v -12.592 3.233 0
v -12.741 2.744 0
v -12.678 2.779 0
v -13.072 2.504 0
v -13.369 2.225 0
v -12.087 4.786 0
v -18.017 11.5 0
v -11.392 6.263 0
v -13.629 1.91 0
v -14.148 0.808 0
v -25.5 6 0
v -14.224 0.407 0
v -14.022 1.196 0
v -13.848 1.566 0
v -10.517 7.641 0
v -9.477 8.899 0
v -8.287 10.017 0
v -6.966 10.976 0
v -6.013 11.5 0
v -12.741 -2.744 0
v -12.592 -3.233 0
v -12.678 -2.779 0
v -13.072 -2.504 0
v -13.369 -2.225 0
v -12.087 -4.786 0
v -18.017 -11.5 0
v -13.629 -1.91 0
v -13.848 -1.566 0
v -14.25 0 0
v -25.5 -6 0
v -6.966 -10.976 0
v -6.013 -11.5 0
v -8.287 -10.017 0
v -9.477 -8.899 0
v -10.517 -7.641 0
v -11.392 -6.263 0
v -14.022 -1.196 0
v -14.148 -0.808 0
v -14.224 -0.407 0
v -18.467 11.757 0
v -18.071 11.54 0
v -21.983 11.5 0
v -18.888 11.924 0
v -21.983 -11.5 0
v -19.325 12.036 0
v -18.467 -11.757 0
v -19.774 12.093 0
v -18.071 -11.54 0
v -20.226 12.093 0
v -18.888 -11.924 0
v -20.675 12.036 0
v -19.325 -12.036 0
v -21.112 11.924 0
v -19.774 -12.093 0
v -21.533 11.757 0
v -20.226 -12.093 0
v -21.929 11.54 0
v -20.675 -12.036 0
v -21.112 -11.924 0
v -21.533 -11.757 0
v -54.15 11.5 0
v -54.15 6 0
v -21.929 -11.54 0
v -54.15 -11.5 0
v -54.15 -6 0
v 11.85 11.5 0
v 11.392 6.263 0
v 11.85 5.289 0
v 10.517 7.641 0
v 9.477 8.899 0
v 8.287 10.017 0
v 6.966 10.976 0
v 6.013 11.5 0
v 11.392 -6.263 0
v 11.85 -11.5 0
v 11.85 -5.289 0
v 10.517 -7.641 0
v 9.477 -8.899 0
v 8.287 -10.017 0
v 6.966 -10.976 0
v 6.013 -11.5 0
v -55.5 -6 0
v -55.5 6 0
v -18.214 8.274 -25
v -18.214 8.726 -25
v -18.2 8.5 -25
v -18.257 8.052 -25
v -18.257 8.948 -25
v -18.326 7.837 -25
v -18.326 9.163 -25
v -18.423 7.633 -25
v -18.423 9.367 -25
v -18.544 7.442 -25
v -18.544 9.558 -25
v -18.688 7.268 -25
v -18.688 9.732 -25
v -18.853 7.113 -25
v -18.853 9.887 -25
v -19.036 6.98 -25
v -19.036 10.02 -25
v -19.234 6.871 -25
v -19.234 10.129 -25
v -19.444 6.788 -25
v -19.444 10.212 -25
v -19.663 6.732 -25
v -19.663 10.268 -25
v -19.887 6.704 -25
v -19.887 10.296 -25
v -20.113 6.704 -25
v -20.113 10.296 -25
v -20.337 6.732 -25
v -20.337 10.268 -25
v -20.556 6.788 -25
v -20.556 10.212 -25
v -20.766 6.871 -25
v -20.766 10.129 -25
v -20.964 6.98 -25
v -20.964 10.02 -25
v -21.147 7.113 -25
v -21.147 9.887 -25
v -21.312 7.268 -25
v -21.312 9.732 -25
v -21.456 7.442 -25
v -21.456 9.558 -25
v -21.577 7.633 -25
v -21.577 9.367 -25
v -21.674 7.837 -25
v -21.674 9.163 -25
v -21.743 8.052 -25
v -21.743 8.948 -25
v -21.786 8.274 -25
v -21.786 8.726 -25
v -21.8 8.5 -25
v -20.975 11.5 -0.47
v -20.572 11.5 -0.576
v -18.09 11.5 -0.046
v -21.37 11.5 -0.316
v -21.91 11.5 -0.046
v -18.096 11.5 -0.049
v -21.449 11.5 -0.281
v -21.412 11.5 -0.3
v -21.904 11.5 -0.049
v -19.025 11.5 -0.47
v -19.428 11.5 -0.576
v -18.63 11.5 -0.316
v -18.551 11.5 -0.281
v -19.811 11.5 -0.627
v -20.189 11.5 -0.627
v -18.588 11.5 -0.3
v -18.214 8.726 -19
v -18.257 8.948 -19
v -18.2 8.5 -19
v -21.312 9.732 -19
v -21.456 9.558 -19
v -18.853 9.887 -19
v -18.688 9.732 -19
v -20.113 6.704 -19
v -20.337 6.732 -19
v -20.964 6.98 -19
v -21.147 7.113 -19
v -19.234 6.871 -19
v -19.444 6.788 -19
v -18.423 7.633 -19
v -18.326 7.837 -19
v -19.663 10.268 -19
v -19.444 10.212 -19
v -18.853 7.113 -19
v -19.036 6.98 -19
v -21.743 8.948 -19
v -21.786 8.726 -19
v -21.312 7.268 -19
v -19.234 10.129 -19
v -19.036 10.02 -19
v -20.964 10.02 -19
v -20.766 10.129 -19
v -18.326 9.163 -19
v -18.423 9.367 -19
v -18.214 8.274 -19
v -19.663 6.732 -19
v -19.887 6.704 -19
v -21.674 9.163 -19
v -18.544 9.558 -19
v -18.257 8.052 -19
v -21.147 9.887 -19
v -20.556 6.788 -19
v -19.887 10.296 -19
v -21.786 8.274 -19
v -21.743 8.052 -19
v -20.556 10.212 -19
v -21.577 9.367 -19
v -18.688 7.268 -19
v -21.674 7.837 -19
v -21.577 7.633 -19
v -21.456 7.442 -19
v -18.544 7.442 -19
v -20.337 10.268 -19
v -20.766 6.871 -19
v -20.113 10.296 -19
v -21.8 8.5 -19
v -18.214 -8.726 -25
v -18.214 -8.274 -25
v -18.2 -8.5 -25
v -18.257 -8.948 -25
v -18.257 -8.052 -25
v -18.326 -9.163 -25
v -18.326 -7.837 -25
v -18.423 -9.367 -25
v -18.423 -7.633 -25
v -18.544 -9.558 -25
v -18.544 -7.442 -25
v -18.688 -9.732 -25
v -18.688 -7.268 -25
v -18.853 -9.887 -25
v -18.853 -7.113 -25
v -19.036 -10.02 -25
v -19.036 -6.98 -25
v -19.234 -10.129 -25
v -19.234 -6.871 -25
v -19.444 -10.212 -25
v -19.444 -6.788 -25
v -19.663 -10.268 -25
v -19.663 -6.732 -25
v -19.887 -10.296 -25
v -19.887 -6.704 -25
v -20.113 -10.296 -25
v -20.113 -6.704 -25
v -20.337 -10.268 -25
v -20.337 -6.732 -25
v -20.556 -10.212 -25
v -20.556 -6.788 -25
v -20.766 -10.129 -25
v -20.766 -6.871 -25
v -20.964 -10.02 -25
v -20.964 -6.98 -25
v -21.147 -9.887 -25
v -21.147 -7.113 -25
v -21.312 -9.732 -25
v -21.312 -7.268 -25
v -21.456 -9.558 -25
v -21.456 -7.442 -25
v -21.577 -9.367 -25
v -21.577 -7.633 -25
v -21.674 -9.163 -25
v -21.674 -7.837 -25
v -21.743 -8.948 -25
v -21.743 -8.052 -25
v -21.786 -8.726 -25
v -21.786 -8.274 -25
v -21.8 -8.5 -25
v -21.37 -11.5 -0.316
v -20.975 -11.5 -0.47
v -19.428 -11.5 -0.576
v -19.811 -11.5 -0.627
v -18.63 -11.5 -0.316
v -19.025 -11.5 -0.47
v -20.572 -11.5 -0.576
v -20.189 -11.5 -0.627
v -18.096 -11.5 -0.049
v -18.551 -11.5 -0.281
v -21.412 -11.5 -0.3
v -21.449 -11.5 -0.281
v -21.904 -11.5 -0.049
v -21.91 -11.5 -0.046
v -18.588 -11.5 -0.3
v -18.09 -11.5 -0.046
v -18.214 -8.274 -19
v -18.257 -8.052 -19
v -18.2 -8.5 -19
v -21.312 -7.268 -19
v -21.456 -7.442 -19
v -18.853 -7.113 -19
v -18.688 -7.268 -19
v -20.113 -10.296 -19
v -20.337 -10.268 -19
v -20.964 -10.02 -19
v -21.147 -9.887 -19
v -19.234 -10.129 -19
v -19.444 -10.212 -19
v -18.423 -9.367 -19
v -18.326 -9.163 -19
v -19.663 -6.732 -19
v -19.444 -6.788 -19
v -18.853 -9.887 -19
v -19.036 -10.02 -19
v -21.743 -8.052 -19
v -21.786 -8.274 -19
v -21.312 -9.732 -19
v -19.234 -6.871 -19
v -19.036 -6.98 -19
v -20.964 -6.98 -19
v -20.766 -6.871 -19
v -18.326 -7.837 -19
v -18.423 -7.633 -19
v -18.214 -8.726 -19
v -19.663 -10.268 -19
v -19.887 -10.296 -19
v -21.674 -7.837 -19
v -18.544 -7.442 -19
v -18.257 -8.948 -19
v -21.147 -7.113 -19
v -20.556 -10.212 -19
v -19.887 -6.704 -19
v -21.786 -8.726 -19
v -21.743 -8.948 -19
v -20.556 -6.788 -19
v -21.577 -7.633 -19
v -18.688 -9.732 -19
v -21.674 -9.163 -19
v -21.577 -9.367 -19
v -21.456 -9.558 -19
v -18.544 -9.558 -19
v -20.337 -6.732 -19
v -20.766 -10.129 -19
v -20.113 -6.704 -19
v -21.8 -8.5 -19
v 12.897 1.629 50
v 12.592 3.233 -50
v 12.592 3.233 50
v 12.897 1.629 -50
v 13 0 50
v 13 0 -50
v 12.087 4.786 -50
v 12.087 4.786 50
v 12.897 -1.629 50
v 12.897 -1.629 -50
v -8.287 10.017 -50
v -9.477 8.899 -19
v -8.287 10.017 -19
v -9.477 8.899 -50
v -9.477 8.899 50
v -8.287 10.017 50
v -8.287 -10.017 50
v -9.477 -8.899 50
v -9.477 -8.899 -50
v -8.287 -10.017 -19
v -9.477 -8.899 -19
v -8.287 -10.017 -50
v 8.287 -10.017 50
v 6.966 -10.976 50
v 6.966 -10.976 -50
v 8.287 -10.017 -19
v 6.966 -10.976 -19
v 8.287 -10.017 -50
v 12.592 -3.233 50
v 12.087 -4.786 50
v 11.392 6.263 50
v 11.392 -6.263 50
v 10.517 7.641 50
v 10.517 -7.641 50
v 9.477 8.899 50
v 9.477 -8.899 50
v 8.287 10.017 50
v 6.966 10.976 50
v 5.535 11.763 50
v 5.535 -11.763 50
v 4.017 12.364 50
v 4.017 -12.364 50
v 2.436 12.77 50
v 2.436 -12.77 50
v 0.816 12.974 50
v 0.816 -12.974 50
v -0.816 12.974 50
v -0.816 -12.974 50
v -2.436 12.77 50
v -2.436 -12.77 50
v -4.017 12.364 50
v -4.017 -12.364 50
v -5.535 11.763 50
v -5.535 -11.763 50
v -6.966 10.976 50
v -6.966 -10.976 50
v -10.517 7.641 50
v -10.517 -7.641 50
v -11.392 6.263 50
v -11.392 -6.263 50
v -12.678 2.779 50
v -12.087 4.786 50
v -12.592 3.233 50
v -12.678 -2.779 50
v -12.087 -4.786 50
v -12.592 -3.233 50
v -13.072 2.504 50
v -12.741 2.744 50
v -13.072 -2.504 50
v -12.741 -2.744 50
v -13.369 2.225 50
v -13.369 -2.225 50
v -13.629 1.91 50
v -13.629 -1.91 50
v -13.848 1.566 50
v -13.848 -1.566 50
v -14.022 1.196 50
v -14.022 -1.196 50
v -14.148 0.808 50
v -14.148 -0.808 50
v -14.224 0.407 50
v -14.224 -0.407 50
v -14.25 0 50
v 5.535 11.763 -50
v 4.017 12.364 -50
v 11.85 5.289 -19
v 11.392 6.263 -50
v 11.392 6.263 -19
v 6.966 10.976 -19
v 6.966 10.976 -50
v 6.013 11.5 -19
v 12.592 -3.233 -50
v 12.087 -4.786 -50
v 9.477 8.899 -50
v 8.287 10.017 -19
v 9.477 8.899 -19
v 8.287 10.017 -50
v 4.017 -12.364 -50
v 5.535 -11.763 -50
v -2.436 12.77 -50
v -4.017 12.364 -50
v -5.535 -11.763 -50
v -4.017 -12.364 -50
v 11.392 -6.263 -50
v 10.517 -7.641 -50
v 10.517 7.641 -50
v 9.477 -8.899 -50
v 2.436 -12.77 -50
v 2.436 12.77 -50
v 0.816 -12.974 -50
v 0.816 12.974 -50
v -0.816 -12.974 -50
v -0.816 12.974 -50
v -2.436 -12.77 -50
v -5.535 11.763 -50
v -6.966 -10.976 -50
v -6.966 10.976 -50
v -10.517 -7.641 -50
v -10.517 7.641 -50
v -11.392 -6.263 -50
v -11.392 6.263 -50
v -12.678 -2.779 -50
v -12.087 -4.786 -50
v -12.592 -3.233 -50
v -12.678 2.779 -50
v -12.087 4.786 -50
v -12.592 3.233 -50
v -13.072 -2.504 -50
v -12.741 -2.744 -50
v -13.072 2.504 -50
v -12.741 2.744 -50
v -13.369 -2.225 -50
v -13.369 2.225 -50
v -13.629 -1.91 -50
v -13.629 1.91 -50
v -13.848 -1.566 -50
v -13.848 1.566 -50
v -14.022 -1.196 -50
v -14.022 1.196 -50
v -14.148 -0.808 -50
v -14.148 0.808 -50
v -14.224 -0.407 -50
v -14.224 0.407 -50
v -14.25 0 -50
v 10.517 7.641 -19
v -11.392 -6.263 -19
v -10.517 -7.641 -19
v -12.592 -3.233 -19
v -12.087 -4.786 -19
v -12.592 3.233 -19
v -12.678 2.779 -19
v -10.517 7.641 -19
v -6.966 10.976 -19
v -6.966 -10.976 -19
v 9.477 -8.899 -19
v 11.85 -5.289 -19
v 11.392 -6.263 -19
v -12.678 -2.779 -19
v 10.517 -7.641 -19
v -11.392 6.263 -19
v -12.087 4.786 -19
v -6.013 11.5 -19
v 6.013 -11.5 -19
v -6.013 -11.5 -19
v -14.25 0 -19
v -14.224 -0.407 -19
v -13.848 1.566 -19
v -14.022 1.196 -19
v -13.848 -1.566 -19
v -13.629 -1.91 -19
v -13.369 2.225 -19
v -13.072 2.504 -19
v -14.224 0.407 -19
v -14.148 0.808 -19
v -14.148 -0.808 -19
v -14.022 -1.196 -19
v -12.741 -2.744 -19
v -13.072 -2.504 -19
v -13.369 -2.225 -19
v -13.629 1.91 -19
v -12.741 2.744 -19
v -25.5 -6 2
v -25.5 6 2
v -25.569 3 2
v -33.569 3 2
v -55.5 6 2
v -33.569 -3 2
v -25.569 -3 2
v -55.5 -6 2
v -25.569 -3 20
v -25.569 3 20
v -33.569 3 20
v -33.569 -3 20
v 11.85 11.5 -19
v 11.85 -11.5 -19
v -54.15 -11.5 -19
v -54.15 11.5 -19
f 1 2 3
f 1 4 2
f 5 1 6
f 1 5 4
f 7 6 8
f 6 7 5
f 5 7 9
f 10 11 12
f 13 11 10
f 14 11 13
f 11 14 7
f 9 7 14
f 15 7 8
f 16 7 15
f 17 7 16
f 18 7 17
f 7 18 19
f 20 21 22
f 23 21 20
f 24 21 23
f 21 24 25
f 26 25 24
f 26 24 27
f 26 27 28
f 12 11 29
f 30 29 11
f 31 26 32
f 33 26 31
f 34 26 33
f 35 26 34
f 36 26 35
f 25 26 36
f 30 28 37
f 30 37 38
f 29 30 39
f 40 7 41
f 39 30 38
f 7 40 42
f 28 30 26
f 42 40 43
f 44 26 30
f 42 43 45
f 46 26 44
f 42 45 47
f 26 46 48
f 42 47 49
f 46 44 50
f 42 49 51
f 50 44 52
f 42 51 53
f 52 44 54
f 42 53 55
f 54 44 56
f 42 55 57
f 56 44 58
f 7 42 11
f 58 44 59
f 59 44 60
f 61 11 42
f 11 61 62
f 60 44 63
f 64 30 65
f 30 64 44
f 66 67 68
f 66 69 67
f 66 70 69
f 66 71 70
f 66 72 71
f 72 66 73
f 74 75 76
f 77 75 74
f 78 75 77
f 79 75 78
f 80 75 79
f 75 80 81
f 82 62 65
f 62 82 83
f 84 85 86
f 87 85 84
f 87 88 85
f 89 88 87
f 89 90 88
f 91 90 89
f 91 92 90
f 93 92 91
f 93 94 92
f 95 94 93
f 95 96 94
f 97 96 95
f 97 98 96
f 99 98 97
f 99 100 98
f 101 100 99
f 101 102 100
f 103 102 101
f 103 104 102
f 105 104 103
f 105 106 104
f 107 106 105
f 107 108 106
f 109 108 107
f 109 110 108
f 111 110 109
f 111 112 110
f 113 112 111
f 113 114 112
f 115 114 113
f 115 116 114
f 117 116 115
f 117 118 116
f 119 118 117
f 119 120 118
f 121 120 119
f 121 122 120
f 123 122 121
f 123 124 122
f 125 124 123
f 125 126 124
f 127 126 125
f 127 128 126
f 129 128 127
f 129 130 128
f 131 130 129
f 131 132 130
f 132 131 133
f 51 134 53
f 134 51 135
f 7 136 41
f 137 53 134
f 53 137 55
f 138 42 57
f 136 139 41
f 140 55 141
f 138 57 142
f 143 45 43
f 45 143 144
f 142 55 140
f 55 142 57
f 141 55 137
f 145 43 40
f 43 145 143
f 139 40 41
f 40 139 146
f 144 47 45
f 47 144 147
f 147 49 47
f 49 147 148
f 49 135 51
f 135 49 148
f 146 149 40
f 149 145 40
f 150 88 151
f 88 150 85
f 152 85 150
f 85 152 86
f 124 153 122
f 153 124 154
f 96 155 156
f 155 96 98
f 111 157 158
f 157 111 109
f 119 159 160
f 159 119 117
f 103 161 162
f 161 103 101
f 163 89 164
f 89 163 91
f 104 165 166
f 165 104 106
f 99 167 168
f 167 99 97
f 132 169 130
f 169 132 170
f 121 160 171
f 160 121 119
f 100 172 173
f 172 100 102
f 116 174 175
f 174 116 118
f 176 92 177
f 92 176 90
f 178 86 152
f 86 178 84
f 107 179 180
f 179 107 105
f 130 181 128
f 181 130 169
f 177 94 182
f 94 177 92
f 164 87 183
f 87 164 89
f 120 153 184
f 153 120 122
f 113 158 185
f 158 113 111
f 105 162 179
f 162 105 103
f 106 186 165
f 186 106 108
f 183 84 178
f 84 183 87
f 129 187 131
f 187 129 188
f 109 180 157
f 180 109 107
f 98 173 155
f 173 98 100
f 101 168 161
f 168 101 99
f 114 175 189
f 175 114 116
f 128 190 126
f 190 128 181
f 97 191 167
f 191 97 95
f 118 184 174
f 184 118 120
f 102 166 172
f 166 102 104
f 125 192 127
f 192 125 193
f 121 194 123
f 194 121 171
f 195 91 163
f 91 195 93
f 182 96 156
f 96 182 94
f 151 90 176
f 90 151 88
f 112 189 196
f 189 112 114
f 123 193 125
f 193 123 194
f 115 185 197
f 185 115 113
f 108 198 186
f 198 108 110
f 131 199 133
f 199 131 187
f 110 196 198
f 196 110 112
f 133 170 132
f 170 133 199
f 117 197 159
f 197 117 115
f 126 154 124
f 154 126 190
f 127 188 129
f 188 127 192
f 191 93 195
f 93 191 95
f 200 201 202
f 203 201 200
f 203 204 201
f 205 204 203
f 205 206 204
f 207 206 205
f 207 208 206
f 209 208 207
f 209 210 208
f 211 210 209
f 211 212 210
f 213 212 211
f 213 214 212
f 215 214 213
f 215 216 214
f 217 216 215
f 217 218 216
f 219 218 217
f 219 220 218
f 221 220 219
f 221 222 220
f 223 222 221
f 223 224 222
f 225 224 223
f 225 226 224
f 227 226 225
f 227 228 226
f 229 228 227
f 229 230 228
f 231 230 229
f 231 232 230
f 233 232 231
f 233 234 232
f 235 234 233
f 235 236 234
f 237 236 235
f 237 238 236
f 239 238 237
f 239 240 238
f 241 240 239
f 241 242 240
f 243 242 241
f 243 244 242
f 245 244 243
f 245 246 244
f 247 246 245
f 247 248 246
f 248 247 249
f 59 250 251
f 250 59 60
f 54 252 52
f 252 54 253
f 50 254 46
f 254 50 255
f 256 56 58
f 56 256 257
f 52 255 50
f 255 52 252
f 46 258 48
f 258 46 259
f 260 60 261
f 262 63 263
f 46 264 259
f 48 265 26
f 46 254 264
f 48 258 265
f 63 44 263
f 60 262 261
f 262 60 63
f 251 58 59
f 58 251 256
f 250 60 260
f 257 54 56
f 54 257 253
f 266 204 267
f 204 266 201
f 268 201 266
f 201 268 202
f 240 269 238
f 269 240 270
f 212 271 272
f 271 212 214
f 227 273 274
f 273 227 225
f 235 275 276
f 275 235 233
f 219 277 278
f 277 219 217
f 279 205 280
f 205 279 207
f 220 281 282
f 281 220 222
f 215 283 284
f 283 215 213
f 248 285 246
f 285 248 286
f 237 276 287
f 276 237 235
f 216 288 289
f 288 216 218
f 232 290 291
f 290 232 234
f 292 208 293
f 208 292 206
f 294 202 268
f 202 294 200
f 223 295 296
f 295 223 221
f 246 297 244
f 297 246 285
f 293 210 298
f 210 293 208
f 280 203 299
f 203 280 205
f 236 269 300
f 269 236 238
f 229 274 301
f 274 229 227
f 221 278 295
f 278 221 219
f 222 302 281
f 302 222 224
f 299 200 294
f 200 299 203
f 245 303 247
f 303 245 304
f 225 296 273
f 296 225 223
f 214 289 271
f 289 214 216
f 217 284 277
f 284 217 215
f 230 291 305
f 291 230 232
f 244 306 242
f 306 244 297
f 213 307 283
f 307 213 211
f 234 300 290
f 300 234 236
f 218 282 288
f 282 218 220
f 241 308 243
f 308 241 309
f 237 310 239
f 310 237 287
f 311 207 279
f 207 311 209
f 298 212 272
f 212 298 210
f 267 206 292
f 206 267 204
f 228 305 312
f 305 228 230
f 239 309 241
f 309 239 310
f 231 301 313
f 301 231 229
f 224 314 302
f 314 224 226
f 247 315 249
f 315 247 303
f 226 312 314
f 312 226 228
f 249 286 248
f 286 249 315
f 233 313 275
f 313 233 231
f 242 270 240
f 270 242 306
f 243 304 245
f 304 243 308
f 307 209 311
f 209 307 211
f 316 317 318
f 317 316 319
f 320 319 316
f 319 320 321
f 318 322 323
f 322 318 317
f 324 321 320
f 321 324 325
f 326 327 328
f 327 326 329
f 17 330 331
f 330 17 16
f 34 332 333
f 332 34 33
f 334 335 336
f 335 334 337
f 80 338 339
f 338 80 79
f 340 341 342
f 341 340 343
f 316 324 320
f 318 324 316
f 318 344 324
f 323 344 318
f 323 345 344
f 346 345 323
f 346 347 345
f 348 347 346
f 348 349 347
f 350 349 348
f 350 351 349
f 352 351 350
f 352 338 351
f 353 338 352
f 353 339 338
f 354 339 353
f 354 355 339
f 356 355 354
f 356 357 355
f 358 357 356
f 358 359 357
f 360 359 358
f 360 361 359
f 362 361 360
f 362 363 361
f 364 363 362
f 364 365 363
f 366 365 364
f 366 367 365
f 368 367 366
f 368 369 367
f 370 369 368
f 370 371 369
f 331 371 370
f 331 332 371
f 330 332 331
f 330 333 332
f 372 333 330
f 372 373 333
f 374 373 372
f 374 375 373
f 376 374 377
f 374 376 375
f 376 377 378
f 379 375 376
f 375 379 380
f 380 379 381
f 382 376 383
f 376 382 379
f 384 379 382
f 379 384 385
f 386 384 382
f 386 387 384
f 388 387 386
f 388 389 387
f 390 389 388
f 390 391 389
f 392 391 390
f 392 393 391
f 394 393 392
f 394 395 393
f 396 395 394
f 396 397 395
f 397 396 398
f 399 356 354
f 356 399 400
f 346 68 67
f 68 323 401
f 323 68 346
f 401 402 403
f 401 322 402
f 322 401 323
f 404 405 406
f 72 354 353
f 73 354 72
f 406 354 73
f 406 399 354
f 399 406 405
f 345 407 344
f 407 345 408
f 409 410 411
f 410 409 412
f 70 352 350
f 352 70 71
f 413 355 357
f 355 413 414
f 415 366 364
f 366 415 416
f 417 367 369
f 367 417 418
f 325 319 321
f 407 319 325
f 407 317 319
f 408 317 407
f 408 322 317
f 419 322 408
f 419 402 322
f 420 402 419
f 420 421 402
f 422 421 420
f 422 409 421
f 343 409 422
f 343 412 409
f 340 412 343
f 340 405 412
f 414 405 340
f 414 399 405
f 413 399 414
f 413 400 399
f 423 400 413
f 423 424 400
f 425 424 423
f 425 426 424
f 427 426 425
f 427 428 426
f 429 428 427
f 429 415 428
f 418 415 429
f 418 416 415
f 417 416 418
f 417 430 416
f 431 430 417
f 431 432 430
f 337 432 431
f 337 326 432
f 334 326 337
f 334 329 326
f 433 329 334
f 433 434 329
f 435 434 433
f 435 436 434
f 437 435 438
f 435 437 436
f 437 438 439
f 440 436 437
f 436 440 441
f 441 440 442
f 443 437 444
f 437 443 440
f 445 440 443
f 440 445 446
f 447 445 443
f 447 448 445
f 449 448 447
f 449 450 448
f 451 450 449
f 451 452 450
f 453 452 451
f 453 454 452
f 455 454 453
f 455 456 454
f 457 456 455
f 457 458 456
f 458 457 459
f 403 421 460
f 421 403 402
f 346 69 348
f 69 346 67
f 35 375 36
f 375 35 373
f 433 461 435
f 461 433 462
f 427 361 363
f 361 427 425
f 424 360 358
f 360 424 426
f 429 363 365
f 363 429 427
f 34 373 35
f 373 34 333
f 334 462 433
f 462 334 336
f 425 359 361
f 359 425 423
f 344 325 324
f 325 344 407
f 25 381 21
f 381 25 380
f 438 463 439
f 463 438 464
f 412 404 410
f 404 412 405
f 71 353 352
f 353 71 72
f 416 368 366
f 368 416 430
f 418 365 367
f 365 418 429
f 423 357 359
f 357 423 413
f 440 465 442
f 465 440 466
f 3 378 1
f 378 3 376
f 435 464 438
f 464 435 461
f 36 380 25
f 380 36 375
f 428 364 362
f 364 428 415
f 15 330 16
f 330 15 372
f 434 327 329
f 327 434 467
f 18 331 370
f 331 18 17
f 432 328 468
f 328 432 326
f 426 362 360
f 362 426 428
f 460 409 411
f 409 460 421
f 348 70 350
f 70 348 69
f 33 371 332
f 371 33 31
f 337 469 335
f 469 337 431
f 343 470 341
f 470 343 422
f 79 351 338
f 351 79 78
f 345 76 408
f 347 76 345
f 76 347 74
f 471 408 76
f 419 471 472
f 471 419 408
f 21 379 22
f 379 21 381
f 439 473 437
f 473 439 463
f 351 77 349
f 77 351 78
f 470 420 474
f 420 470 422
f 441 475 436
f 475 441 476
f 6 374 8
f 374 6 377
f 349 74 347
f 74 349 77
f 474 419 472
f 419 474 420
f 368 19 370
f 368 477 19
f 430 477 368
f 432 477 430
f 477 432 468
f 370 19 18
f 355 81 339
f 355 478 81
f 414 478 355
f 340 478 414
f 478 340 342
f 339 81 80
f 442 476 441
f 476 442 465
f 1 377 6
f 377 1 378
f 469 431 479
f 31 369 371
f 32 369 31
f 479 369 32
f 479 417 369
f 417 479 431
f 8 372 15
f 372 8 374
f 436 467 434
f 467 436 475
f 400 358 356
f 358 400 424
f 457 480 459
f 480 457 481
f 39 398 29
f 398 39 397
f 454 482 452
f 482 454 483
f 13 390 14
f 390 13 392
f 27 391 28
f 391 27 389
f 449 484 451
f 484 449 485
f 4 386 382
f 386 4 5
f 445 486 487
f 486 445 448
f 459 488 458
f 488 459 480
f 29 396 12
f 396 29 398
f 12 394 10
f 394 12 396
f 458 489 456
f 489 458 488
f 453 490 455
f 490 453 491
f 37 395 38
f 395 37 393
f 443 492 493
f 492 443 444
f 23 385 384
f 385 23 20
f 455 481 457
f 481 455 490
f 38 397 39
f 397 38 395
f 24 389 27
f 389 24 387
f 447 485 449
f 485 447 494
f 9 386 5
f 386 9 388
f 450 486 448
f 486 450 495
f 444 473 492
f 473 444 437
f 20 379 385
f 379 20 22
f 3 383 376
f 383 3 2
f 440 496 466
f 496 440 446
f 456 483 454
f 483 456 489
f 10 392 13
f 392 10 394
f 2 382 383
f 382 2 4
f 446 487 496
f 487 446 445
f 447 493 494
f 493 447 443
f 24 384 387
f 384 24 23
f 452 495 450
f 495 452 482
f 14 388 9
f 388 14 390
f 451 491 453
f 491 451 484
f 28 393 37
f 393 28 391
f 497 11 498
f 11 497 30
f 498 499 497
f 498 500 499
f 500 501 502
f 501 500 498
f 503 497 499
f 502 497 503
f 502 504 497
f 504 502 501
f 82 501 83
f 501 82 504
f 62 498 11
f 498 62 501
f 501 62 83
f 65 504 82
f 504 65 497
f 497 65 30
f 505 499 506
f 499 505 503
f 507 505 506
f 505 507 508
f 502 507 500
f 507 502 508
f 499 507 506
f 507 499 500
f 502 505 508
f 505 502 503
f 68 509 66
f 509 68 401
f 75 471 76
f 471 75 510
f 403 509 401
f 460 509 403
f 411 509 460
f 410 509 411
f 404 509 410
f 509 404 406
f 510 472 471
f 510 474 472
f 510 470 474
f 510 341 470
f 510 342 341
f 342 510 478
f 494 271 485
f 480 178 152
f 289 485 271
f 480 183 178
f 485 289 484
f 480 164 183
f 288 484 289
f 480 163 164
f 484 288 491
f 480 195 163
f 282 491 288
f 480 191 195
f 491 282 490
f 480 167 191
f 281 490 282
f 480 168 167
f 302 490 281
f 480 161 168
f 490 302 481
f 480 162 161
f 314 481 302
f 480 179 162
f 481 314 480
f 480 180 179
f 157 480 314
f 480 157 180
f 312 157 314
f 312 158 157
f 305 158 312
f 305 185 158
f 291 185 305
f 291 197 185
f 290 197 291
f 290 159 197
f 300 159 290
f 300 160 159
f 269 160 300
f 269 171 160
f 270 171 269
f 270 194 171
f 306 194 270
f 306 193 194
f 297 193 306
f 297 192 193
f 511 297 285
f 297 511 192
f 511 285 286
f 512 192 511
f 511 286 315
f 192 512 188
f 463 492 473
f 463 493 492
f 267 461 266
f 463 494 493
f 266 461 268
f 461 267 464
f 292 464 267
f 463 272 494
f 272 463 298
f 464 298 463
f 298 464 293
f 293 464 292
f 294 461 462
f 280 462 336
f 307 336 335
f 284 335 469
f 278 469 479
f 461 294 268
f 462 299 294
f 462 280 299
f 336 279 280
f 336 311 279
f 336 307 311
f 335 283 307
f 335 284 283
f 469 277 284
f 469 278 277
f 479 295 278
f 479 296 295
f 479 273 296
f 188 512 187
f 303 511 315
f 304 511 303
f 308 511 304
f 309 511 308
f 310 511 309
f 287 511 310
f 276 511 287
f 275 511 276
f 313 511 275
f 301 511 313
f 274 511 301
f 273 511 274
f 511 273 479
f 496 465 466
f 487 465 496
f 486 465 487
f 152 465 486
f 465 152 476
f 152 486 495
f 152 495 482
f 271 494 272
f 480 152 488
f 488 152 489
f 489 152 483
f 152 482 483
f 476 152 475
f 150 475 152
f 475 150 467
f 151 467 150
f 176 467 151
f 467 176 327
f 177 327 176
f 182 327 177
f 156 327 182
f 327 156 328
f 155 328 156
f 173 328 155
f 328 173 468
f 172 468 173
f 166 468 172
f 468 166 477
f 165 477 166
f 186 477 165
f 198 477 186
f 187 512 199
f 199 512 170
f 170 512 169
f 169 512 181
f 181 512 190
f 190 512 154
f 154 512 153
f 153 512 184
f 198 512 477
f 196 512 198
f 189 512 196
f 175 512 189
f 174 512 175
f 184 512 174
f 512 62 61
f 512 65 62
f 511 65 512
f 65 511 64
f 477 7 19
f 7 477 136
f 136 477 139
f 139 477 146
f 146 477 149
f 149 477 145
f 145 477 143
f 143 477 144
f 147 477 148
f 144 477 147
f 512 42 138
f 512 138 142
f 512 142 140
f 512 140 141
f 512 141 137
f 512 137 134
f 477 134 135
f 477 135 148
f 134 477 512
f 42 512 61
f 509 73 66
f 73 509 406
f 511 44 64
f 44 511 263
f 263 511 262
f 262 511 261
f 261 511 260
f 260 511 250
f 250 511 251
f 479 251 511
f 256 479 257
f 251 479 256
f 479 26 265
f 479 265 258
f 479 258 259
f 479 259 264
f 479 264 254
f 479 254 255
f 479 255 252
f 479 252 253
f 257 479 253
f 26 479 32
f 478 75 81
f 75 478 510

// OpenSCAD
$fn = 50;


difference() {
	union() {
		translate(v = [-20, 8.5000000000, 0]) {
			rotate(a = [0, 0, 0]) {
				difference() {
					union() {
						translate(v = [0, 0, -25.0000000000]) {
							cylinder(h = 25, r = 1.5000000000);
						}
						translate(v = [0, 0, -1.9000000000]) {
							cylinder(h = 1.9000000000, r1 = 1.8000000000, r2 = 3.6000000000);
						}
						translate(v = [0, 0, -25.0000000000]) {
							cylinder(h = 25, r = 1.8000000000);
						}
						translate(v = [0, 0, -25.0000000000]) {
							cylinder(h = 25, r = 1.5000000000);
						}
					}
					union();
				}
			}
		}
		translate(v = [-20, -8.5000000000, 0]) {
			rotate(a = [0, 0, 0]) {
				difference() {
					union() {
						translate(v = [0, 0, -25.0000000000]) {
							cylinder(h = 25, r = 1.5000000000);
						}
						translate(v = [0, 0, -1.9000000000]) {
							cylinder(h = 1.9000000000, r1 = 1.8000000000, r2 = 3.6000000000);
						}
						translate(v = [0, 0, -25.0000000000]) {
							cylinder(h = 25, r = 1.8000000000);
						}
						translate(v = [0, 0, -25.0000000000]) {
							cylinder(h = 25, r = 1.5000000000);
						}
					}
					union();
				}
			}
		}
		*color(alpha = 1.0000000000, c = "gray") {
			translate(v = [0, 51, 0]) {
				linear_extrude(height = 1) {
					text(font = "Arial:style=Bold", halign = "center", size = 4.5000000000, text = "COMMENT oobb_motor_tt_01_0_0", valign = "center");
				}
			}
		}
		*color(alpha = 1.0000000000, c = "gray") {
			translate(v = [0, 44, 0]) {
				linear_extrude(height = 1) {
					text(font = "Arial:style=Bold", halign = "center", size = 4.5000000000, text = " radius_extra : 0", valign = "center");
				}
			}
		}
		*color(alpha = 1.0000000000, c = "gray") {
			translate(v = [0, 44, 0]) {
				linear_extrude(height = 1) {
					text(font = "Arial:style=Bold", halign = "center", size = 4.5000000000, text = "COMMENT description oobb_motor_tt_01_shape_p_type_30_comment_shift_line_{}_extra_0_radius_extra", valign = "center");
				}
			}
		}
		translate(v = [0, 0, -50.0000000000]) {
			cylinder(h = 100, r = 13.0000000000);
		}
		translate(v = [-11, 0, -50.0000000000]) {
			cylinder(h = 100, r = 3.2500000000);
		}
		translate(v = [-55.5000000000, -6.0000000000, 0]) {
			cube(size = [30, 12, 2]);
		}
		translate(v = [-54.0000000000, -4.0000000000, 0]) {
			cube(size = [18, 8, 2]);
		}
		translate(v = [-33.5690000000, -3.0000000000, 0]) {
			cube(size = [8, 6, 20]);
		}
		translate(v = [-54.1500000000, -11.5000000000, -19]) {
			cube(size = [66, 23, 19]);
		}
	}
	union();
}
